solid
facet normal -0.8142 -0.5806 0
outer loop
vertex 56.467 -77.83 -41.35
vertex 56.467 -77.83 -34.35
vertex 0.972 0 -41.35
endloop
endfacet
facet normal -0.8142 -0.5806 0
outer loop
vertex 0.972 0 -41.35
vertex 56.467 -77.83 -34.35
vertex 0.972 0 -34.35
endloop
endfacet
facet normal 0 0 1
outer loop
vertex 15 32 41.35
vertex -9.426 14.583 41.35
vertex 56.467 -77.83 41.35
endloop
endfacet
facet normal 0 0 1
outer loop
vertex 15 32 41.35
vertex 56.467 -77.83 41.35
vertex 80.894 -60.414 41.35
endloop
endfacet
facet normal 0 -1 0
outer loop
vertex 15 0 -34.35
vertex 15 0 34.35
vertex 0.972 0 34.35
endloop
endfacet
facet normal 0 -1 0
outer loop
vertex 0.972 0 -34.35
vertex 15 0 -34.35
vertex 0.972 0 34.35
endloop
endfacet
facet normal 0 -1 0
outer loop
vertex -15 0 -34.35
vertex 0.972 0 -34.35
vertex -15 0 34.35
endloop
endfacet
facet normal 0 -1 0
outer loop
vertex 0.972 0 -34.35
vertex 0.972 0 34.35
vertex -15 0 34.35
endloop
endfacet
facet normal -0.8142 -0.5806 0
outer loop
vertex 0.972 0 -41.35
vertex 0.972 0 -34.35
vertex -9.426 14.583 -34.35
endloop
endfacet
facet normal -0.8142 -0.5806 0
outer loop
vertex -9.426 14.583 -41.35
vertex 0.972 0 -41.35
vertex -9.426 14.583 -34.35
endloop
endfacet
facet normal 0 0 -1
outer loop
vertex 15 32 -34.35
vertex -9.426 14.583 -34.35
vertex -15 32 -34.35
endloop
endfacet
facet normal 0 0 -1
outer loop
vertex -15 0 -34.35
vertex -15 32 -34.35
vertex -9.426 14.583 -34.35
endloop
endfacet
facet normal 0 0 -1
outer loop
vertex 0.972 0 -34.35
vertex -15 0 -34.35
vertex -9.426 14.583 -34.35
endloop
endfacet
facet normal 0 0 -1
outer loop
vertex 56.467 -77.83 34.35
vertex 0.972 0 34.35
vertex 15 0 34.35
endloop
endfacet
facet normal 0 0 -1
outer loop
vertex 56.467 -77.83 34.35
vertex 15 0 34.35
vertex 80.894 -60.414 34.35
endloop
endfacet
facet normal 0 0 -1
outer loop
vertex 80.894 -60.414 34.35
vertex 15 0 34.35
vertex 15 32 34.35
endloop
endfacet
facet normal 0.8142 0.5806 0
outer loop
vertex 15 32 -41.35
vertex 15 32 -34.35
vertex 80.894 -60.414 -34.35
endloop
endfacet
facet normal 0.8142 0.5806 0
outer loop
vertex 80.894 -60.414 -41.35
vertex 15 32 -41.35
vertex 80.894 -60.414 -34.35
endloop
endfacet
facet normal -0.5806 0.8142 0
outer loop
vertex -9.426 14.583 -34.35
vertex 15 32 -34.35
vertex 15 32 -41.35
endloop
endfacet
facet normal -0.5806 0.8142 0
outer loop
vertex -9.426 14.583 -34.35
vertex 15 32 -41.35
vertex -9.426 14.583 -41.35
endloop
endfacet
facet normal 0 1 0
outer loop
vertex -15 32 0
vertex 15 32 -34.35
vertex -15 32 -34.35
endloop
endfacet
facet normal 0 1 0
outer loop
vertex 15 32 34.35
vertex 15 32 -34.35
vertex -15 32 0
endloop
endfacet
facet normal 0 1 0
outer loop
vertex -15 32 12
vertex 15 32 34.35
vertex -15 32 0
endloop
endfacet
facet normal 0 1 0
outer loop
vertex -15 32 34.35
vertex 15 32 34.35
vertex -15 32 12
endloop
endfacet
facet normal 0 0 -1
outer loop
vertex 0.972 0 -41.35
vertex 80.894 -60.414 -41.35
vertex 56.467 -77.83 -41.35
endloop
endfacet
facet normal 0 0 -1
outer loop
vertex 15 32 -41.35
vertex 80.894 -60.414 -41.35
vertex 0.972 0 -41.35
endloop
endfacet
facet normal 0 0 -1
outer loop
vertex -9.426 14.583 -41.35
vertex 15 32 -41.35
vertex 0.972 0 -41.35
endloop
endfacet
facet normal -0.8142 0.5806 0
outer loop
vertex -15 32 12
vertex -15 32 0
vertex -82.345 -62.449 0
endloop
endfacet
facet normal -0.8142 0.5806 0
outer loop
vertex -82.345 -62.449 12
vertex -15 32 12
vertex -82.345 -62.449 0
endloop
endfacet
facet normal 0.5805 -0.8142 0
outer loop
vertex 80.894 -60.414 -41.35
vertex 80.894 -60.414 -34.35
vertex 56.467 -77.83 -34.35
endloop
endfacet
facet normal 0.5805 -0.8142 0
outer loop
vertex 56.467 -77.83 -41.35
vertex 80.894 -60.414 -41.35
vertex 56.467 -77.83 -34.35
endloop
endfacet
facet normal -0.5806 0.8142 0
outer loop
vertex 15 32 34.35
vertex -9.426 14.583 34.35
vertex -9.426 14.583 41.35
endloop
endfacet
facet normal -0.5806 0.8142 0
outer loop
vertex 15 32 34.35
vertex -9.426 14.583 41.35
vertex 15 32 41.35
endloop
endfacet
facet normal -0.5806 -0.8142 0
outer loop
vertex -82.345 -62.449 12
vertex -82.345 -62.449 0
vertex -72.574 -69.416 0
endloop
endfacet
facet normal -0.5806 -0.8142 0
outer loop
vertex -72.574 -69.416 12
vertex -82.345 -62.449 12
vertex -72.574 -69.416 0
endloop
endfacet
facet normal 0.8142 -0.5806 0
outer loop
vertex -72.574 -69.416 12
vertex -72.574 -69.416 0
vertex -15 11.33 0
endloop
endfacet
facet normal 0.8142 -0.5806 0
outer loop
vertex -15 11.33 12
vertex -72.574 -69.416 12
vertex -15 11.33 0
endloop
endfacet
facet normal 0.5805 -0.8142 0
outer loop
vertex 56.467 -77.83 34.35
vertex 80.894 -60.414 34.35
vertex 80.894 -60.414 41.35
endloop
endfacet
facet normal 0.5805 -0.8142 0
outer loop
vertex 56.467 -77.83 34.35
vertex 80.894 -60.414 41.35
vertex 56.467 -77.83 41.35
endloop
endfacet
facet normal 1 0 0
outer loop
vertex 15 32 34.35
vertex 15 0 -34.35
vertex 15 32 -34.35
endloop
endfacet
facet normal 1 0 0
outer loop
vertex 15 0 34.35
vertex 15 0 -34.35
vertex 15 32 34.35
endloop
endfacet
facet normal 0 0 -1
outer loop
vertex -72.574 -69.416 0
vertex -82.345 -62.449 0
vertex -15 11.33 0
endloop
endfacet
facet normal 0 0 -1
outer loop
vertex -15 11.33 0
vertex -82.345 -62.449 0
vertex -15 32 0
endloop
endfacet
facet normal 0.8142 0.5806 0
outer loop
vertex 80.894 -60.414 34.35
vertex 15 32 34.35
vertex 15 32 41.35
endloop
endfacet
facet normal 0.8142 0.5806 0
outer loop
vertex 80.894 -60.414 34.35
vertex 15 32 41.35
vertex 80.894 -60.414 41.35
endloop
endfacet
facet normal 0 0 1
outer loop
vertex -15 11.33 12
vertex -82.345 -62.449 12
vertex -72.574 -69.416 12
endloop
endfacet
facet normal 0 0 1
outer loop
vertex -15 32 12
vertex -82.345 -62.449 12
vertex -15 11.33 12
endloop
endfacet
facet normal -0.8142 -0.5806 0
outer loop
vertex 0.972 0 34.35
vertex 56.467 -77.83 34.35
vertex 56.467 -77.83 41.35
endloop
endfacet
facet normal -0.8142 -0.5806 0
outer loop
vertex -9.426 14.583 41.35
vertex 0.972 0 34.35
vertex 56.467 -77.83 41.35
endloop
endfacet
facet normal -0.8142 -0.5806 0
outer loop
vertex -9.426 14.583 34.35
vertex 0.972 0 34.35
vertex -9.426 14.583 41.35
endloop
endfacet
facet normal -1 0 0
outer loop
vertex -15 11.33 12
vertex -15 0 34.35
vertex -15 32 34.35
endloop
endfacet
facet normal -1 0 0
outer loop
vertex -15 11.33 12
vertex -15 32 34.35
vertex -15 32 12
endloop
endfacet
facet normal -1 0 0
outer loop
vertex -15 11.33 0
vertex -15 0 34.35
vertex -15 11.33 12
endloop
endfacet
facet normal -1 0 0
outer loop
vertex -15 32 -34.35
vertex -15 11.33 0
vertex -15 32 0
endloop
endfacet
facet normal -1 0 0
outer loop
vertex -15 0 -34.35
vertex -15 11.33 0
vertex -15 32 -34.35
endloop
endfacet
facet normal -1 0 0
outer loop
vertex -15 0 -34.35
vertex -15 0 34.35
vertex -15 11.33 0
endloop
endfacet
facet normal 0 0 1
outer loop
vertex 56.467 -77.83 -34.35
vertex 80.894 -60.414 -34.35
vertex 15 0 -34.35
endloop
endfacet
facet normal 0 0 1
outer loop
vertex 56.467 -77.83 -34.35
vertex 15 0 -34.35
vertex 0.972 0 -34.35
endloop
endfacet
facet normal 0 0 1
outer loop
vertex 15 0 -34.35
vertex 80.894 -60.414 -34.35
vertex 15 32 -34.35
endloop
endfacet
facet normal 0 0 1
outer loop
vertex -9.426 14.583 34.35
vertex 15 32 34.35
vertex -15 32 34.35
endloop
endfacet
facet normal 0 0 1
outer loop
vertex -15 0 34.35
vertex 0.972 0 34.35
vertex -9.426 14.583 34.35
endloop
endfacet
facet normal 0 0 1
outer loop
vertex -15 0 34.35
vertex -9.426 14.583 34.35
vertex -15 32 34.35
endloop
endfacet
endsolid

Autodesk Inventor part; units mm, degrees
ref_plane "YZ Plane" through (0, 0, 0) normal (1, 0, 0) x (0, 1, 0)
ref_plane "XZ Plane" through (0, 0, 0) normal (0, 1, 0) x (-1, 0, 0)
ref_plane "XY Plane" through (0, 0, 0) normal (0, 0, 1) x (1, 0, 0)
sketch "Boceto1" plane through (0, 0, 0) normal (0, 1, 0) x (-1, 0, 0)
  line L0 (15, 34.35) -> (15, -34.35)
  line L1 (15, -34.35) -> (-15, -34.35)
  line L2 (-15, -34.35) -> (-15, 34.35)
  line L3 (-15, 34.35) -> (15, 34.35)
  line L4 (15, 34.35) -> (-15, -34.35) construction
  line L5 (15, -34.35) -> (-15, 34.35) construction
  point P0 (0, 0)
  dimension "d0" = 68.7
  dimension "d1" = 30
extrude "Extrusión1" add sketch "Boceto1" along normal blind 32
sketch "Boceto2" plane through (-15, 0, 34.35) normal (0, 0, 1) x (1, 0, 0)
  line L0 (0, 32) -> (30, 32) projected
  line L1 (30, 32) -> (95.8937, -60.4136)
  line L2 (30, 32) -> (143.5, 32) construction
  line L3 (95.8937, -60.4136) -> (71.4672, -77.8304)
  line L4 (71.4672, -77.8304) -> (5.5735, 14.5832)
  line L5 (5.5735, 14.5832) -> (30, 32)
  point P0 (15, 0)
  dimension "d4" = 113.5
  dimension "d5" = 54.51
  dimension "d6" = 30
  dimension "d7" = 90
extrude "Extrusión2" add sketch "Boceto2" along normal blind 7
sketch "Boceto3" plane through (15, 0, -34.35) normal (0, 0, -1) x (-1, 0, 0)
  line L0 (0, 32) -> (-65.8937, -60.4136) projected
  line L1 (-41.4672, -77.8304) -> (14.0283, 0) projected
  line L2 (-65.8937, -60.4136) -> (-41.4672, -77.8304) projected
  line L3 (0, 32) -> (24.4265, 14.5832) projected
  line L4 (0, 32) -> (-65.8937, -60.4136)
  line L5 (-41.4672, -77.8304) -> (-65.8937, -60.4136)
  line L6 (-41.4672, -77.8304) -> (24.4265, 14.5832)
  line L7 (24.4265, 14.5832) -> (0, 32)
  point P0 (15, 0)
extrude "Extrusión3" add sketch "Boceto3" along normal blind 7
sketch "Boceto4" plane through (0, 0, 0) normal (0, 0, 1) x (1, 0, 0)
  line L0 (15, 32) -> (-15, 32) projected
  line L1 (-15, 32) -> (-82.3451, -62.4492)
  line L2 (-15, 32) -> (101, 32) construction
  line L3 (-82.3451, -62.4492) -> (-72.5745, -69.4159)
  line L4 (-72.5745, -69.4159) -> (-15, 11.3303)
  line L5 (-15, 0) -> (-15, 32) projected
  line L6 (-15, 11.3303) -> (-15, 32)
  point P0 (0, 0)
  dimension "d12" = 116
  dimension "d13" = 125.49
  dimension "d14" = 12
extrude "Extrusión4" add sketch "Boceto4" along normal blind 12
properties part number "structure"
